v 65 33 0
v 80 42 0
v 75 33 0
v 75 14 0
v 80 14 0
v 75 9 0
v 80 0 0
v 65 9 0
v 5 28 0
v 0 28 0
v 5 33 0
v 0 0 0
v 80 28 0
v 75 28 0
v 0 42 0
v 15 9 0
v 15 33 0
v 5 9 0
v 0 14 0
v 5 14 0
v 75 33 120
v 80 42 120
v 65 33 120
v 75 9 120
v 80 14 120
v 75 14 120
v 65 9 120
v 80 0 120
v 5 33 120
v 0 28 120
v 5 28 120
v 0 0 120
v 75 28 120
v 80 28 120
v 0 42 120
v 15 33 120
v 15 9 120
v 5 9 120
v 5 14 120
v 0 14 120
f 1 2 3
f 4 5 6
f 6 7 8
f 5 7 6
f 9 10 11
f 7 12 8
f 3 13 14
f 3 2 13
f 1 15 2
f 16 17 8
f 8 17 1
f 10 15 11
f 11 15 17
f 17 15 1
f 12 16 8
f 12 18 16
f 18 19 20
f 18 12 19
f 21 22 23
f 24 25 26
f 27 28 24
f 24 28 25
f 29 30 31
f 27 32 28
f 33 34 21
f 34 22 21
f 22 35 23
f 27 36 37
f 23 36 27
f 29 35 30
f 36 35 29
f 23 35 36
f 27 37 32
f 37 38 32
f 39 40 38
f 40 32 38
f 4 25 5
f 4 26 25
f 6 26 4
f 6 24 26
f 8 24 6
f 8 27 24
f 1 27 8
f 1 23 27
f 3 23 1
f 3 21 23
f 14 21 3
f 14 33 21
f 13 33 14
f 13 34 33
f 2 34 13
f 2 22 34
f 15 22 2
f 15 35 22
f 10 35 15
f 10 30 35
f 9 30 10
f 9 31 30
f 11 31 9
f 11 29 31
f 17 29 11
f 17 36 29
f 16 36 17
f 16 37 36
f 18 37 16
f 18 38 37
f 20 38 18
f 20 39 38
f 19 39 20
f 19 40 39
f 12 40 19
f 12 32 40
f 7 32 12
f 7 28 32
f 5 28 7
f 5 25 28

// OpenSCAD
$fn = 32;

// ----------------------------------------------------------------------
// T-slot rail: 80 x 42 mm section, 120 mm long
// ----------------------------------------------------------------------

// --- parameters (mm) ---
profile_height = 120;     // extrusion height
profile_points = 20;      // points of the closed outline

profile = [[0, 0], [80, 0], [80, 14], [75, 14], [75, 9], [65, 9], [65, 33], [75, 33], [75, 28], [80, 28], [80, 42], [0, 42], [0, 28], [5, 28], [5, 33], [15, 33], [15, 9], [5, 9], [5, 14], [0, 14]];  // single closed polygon, 20 points, counter clockwise

// --- the one profile operation ---
linear_extrude(height = profile_height) polygon(points = profile);
